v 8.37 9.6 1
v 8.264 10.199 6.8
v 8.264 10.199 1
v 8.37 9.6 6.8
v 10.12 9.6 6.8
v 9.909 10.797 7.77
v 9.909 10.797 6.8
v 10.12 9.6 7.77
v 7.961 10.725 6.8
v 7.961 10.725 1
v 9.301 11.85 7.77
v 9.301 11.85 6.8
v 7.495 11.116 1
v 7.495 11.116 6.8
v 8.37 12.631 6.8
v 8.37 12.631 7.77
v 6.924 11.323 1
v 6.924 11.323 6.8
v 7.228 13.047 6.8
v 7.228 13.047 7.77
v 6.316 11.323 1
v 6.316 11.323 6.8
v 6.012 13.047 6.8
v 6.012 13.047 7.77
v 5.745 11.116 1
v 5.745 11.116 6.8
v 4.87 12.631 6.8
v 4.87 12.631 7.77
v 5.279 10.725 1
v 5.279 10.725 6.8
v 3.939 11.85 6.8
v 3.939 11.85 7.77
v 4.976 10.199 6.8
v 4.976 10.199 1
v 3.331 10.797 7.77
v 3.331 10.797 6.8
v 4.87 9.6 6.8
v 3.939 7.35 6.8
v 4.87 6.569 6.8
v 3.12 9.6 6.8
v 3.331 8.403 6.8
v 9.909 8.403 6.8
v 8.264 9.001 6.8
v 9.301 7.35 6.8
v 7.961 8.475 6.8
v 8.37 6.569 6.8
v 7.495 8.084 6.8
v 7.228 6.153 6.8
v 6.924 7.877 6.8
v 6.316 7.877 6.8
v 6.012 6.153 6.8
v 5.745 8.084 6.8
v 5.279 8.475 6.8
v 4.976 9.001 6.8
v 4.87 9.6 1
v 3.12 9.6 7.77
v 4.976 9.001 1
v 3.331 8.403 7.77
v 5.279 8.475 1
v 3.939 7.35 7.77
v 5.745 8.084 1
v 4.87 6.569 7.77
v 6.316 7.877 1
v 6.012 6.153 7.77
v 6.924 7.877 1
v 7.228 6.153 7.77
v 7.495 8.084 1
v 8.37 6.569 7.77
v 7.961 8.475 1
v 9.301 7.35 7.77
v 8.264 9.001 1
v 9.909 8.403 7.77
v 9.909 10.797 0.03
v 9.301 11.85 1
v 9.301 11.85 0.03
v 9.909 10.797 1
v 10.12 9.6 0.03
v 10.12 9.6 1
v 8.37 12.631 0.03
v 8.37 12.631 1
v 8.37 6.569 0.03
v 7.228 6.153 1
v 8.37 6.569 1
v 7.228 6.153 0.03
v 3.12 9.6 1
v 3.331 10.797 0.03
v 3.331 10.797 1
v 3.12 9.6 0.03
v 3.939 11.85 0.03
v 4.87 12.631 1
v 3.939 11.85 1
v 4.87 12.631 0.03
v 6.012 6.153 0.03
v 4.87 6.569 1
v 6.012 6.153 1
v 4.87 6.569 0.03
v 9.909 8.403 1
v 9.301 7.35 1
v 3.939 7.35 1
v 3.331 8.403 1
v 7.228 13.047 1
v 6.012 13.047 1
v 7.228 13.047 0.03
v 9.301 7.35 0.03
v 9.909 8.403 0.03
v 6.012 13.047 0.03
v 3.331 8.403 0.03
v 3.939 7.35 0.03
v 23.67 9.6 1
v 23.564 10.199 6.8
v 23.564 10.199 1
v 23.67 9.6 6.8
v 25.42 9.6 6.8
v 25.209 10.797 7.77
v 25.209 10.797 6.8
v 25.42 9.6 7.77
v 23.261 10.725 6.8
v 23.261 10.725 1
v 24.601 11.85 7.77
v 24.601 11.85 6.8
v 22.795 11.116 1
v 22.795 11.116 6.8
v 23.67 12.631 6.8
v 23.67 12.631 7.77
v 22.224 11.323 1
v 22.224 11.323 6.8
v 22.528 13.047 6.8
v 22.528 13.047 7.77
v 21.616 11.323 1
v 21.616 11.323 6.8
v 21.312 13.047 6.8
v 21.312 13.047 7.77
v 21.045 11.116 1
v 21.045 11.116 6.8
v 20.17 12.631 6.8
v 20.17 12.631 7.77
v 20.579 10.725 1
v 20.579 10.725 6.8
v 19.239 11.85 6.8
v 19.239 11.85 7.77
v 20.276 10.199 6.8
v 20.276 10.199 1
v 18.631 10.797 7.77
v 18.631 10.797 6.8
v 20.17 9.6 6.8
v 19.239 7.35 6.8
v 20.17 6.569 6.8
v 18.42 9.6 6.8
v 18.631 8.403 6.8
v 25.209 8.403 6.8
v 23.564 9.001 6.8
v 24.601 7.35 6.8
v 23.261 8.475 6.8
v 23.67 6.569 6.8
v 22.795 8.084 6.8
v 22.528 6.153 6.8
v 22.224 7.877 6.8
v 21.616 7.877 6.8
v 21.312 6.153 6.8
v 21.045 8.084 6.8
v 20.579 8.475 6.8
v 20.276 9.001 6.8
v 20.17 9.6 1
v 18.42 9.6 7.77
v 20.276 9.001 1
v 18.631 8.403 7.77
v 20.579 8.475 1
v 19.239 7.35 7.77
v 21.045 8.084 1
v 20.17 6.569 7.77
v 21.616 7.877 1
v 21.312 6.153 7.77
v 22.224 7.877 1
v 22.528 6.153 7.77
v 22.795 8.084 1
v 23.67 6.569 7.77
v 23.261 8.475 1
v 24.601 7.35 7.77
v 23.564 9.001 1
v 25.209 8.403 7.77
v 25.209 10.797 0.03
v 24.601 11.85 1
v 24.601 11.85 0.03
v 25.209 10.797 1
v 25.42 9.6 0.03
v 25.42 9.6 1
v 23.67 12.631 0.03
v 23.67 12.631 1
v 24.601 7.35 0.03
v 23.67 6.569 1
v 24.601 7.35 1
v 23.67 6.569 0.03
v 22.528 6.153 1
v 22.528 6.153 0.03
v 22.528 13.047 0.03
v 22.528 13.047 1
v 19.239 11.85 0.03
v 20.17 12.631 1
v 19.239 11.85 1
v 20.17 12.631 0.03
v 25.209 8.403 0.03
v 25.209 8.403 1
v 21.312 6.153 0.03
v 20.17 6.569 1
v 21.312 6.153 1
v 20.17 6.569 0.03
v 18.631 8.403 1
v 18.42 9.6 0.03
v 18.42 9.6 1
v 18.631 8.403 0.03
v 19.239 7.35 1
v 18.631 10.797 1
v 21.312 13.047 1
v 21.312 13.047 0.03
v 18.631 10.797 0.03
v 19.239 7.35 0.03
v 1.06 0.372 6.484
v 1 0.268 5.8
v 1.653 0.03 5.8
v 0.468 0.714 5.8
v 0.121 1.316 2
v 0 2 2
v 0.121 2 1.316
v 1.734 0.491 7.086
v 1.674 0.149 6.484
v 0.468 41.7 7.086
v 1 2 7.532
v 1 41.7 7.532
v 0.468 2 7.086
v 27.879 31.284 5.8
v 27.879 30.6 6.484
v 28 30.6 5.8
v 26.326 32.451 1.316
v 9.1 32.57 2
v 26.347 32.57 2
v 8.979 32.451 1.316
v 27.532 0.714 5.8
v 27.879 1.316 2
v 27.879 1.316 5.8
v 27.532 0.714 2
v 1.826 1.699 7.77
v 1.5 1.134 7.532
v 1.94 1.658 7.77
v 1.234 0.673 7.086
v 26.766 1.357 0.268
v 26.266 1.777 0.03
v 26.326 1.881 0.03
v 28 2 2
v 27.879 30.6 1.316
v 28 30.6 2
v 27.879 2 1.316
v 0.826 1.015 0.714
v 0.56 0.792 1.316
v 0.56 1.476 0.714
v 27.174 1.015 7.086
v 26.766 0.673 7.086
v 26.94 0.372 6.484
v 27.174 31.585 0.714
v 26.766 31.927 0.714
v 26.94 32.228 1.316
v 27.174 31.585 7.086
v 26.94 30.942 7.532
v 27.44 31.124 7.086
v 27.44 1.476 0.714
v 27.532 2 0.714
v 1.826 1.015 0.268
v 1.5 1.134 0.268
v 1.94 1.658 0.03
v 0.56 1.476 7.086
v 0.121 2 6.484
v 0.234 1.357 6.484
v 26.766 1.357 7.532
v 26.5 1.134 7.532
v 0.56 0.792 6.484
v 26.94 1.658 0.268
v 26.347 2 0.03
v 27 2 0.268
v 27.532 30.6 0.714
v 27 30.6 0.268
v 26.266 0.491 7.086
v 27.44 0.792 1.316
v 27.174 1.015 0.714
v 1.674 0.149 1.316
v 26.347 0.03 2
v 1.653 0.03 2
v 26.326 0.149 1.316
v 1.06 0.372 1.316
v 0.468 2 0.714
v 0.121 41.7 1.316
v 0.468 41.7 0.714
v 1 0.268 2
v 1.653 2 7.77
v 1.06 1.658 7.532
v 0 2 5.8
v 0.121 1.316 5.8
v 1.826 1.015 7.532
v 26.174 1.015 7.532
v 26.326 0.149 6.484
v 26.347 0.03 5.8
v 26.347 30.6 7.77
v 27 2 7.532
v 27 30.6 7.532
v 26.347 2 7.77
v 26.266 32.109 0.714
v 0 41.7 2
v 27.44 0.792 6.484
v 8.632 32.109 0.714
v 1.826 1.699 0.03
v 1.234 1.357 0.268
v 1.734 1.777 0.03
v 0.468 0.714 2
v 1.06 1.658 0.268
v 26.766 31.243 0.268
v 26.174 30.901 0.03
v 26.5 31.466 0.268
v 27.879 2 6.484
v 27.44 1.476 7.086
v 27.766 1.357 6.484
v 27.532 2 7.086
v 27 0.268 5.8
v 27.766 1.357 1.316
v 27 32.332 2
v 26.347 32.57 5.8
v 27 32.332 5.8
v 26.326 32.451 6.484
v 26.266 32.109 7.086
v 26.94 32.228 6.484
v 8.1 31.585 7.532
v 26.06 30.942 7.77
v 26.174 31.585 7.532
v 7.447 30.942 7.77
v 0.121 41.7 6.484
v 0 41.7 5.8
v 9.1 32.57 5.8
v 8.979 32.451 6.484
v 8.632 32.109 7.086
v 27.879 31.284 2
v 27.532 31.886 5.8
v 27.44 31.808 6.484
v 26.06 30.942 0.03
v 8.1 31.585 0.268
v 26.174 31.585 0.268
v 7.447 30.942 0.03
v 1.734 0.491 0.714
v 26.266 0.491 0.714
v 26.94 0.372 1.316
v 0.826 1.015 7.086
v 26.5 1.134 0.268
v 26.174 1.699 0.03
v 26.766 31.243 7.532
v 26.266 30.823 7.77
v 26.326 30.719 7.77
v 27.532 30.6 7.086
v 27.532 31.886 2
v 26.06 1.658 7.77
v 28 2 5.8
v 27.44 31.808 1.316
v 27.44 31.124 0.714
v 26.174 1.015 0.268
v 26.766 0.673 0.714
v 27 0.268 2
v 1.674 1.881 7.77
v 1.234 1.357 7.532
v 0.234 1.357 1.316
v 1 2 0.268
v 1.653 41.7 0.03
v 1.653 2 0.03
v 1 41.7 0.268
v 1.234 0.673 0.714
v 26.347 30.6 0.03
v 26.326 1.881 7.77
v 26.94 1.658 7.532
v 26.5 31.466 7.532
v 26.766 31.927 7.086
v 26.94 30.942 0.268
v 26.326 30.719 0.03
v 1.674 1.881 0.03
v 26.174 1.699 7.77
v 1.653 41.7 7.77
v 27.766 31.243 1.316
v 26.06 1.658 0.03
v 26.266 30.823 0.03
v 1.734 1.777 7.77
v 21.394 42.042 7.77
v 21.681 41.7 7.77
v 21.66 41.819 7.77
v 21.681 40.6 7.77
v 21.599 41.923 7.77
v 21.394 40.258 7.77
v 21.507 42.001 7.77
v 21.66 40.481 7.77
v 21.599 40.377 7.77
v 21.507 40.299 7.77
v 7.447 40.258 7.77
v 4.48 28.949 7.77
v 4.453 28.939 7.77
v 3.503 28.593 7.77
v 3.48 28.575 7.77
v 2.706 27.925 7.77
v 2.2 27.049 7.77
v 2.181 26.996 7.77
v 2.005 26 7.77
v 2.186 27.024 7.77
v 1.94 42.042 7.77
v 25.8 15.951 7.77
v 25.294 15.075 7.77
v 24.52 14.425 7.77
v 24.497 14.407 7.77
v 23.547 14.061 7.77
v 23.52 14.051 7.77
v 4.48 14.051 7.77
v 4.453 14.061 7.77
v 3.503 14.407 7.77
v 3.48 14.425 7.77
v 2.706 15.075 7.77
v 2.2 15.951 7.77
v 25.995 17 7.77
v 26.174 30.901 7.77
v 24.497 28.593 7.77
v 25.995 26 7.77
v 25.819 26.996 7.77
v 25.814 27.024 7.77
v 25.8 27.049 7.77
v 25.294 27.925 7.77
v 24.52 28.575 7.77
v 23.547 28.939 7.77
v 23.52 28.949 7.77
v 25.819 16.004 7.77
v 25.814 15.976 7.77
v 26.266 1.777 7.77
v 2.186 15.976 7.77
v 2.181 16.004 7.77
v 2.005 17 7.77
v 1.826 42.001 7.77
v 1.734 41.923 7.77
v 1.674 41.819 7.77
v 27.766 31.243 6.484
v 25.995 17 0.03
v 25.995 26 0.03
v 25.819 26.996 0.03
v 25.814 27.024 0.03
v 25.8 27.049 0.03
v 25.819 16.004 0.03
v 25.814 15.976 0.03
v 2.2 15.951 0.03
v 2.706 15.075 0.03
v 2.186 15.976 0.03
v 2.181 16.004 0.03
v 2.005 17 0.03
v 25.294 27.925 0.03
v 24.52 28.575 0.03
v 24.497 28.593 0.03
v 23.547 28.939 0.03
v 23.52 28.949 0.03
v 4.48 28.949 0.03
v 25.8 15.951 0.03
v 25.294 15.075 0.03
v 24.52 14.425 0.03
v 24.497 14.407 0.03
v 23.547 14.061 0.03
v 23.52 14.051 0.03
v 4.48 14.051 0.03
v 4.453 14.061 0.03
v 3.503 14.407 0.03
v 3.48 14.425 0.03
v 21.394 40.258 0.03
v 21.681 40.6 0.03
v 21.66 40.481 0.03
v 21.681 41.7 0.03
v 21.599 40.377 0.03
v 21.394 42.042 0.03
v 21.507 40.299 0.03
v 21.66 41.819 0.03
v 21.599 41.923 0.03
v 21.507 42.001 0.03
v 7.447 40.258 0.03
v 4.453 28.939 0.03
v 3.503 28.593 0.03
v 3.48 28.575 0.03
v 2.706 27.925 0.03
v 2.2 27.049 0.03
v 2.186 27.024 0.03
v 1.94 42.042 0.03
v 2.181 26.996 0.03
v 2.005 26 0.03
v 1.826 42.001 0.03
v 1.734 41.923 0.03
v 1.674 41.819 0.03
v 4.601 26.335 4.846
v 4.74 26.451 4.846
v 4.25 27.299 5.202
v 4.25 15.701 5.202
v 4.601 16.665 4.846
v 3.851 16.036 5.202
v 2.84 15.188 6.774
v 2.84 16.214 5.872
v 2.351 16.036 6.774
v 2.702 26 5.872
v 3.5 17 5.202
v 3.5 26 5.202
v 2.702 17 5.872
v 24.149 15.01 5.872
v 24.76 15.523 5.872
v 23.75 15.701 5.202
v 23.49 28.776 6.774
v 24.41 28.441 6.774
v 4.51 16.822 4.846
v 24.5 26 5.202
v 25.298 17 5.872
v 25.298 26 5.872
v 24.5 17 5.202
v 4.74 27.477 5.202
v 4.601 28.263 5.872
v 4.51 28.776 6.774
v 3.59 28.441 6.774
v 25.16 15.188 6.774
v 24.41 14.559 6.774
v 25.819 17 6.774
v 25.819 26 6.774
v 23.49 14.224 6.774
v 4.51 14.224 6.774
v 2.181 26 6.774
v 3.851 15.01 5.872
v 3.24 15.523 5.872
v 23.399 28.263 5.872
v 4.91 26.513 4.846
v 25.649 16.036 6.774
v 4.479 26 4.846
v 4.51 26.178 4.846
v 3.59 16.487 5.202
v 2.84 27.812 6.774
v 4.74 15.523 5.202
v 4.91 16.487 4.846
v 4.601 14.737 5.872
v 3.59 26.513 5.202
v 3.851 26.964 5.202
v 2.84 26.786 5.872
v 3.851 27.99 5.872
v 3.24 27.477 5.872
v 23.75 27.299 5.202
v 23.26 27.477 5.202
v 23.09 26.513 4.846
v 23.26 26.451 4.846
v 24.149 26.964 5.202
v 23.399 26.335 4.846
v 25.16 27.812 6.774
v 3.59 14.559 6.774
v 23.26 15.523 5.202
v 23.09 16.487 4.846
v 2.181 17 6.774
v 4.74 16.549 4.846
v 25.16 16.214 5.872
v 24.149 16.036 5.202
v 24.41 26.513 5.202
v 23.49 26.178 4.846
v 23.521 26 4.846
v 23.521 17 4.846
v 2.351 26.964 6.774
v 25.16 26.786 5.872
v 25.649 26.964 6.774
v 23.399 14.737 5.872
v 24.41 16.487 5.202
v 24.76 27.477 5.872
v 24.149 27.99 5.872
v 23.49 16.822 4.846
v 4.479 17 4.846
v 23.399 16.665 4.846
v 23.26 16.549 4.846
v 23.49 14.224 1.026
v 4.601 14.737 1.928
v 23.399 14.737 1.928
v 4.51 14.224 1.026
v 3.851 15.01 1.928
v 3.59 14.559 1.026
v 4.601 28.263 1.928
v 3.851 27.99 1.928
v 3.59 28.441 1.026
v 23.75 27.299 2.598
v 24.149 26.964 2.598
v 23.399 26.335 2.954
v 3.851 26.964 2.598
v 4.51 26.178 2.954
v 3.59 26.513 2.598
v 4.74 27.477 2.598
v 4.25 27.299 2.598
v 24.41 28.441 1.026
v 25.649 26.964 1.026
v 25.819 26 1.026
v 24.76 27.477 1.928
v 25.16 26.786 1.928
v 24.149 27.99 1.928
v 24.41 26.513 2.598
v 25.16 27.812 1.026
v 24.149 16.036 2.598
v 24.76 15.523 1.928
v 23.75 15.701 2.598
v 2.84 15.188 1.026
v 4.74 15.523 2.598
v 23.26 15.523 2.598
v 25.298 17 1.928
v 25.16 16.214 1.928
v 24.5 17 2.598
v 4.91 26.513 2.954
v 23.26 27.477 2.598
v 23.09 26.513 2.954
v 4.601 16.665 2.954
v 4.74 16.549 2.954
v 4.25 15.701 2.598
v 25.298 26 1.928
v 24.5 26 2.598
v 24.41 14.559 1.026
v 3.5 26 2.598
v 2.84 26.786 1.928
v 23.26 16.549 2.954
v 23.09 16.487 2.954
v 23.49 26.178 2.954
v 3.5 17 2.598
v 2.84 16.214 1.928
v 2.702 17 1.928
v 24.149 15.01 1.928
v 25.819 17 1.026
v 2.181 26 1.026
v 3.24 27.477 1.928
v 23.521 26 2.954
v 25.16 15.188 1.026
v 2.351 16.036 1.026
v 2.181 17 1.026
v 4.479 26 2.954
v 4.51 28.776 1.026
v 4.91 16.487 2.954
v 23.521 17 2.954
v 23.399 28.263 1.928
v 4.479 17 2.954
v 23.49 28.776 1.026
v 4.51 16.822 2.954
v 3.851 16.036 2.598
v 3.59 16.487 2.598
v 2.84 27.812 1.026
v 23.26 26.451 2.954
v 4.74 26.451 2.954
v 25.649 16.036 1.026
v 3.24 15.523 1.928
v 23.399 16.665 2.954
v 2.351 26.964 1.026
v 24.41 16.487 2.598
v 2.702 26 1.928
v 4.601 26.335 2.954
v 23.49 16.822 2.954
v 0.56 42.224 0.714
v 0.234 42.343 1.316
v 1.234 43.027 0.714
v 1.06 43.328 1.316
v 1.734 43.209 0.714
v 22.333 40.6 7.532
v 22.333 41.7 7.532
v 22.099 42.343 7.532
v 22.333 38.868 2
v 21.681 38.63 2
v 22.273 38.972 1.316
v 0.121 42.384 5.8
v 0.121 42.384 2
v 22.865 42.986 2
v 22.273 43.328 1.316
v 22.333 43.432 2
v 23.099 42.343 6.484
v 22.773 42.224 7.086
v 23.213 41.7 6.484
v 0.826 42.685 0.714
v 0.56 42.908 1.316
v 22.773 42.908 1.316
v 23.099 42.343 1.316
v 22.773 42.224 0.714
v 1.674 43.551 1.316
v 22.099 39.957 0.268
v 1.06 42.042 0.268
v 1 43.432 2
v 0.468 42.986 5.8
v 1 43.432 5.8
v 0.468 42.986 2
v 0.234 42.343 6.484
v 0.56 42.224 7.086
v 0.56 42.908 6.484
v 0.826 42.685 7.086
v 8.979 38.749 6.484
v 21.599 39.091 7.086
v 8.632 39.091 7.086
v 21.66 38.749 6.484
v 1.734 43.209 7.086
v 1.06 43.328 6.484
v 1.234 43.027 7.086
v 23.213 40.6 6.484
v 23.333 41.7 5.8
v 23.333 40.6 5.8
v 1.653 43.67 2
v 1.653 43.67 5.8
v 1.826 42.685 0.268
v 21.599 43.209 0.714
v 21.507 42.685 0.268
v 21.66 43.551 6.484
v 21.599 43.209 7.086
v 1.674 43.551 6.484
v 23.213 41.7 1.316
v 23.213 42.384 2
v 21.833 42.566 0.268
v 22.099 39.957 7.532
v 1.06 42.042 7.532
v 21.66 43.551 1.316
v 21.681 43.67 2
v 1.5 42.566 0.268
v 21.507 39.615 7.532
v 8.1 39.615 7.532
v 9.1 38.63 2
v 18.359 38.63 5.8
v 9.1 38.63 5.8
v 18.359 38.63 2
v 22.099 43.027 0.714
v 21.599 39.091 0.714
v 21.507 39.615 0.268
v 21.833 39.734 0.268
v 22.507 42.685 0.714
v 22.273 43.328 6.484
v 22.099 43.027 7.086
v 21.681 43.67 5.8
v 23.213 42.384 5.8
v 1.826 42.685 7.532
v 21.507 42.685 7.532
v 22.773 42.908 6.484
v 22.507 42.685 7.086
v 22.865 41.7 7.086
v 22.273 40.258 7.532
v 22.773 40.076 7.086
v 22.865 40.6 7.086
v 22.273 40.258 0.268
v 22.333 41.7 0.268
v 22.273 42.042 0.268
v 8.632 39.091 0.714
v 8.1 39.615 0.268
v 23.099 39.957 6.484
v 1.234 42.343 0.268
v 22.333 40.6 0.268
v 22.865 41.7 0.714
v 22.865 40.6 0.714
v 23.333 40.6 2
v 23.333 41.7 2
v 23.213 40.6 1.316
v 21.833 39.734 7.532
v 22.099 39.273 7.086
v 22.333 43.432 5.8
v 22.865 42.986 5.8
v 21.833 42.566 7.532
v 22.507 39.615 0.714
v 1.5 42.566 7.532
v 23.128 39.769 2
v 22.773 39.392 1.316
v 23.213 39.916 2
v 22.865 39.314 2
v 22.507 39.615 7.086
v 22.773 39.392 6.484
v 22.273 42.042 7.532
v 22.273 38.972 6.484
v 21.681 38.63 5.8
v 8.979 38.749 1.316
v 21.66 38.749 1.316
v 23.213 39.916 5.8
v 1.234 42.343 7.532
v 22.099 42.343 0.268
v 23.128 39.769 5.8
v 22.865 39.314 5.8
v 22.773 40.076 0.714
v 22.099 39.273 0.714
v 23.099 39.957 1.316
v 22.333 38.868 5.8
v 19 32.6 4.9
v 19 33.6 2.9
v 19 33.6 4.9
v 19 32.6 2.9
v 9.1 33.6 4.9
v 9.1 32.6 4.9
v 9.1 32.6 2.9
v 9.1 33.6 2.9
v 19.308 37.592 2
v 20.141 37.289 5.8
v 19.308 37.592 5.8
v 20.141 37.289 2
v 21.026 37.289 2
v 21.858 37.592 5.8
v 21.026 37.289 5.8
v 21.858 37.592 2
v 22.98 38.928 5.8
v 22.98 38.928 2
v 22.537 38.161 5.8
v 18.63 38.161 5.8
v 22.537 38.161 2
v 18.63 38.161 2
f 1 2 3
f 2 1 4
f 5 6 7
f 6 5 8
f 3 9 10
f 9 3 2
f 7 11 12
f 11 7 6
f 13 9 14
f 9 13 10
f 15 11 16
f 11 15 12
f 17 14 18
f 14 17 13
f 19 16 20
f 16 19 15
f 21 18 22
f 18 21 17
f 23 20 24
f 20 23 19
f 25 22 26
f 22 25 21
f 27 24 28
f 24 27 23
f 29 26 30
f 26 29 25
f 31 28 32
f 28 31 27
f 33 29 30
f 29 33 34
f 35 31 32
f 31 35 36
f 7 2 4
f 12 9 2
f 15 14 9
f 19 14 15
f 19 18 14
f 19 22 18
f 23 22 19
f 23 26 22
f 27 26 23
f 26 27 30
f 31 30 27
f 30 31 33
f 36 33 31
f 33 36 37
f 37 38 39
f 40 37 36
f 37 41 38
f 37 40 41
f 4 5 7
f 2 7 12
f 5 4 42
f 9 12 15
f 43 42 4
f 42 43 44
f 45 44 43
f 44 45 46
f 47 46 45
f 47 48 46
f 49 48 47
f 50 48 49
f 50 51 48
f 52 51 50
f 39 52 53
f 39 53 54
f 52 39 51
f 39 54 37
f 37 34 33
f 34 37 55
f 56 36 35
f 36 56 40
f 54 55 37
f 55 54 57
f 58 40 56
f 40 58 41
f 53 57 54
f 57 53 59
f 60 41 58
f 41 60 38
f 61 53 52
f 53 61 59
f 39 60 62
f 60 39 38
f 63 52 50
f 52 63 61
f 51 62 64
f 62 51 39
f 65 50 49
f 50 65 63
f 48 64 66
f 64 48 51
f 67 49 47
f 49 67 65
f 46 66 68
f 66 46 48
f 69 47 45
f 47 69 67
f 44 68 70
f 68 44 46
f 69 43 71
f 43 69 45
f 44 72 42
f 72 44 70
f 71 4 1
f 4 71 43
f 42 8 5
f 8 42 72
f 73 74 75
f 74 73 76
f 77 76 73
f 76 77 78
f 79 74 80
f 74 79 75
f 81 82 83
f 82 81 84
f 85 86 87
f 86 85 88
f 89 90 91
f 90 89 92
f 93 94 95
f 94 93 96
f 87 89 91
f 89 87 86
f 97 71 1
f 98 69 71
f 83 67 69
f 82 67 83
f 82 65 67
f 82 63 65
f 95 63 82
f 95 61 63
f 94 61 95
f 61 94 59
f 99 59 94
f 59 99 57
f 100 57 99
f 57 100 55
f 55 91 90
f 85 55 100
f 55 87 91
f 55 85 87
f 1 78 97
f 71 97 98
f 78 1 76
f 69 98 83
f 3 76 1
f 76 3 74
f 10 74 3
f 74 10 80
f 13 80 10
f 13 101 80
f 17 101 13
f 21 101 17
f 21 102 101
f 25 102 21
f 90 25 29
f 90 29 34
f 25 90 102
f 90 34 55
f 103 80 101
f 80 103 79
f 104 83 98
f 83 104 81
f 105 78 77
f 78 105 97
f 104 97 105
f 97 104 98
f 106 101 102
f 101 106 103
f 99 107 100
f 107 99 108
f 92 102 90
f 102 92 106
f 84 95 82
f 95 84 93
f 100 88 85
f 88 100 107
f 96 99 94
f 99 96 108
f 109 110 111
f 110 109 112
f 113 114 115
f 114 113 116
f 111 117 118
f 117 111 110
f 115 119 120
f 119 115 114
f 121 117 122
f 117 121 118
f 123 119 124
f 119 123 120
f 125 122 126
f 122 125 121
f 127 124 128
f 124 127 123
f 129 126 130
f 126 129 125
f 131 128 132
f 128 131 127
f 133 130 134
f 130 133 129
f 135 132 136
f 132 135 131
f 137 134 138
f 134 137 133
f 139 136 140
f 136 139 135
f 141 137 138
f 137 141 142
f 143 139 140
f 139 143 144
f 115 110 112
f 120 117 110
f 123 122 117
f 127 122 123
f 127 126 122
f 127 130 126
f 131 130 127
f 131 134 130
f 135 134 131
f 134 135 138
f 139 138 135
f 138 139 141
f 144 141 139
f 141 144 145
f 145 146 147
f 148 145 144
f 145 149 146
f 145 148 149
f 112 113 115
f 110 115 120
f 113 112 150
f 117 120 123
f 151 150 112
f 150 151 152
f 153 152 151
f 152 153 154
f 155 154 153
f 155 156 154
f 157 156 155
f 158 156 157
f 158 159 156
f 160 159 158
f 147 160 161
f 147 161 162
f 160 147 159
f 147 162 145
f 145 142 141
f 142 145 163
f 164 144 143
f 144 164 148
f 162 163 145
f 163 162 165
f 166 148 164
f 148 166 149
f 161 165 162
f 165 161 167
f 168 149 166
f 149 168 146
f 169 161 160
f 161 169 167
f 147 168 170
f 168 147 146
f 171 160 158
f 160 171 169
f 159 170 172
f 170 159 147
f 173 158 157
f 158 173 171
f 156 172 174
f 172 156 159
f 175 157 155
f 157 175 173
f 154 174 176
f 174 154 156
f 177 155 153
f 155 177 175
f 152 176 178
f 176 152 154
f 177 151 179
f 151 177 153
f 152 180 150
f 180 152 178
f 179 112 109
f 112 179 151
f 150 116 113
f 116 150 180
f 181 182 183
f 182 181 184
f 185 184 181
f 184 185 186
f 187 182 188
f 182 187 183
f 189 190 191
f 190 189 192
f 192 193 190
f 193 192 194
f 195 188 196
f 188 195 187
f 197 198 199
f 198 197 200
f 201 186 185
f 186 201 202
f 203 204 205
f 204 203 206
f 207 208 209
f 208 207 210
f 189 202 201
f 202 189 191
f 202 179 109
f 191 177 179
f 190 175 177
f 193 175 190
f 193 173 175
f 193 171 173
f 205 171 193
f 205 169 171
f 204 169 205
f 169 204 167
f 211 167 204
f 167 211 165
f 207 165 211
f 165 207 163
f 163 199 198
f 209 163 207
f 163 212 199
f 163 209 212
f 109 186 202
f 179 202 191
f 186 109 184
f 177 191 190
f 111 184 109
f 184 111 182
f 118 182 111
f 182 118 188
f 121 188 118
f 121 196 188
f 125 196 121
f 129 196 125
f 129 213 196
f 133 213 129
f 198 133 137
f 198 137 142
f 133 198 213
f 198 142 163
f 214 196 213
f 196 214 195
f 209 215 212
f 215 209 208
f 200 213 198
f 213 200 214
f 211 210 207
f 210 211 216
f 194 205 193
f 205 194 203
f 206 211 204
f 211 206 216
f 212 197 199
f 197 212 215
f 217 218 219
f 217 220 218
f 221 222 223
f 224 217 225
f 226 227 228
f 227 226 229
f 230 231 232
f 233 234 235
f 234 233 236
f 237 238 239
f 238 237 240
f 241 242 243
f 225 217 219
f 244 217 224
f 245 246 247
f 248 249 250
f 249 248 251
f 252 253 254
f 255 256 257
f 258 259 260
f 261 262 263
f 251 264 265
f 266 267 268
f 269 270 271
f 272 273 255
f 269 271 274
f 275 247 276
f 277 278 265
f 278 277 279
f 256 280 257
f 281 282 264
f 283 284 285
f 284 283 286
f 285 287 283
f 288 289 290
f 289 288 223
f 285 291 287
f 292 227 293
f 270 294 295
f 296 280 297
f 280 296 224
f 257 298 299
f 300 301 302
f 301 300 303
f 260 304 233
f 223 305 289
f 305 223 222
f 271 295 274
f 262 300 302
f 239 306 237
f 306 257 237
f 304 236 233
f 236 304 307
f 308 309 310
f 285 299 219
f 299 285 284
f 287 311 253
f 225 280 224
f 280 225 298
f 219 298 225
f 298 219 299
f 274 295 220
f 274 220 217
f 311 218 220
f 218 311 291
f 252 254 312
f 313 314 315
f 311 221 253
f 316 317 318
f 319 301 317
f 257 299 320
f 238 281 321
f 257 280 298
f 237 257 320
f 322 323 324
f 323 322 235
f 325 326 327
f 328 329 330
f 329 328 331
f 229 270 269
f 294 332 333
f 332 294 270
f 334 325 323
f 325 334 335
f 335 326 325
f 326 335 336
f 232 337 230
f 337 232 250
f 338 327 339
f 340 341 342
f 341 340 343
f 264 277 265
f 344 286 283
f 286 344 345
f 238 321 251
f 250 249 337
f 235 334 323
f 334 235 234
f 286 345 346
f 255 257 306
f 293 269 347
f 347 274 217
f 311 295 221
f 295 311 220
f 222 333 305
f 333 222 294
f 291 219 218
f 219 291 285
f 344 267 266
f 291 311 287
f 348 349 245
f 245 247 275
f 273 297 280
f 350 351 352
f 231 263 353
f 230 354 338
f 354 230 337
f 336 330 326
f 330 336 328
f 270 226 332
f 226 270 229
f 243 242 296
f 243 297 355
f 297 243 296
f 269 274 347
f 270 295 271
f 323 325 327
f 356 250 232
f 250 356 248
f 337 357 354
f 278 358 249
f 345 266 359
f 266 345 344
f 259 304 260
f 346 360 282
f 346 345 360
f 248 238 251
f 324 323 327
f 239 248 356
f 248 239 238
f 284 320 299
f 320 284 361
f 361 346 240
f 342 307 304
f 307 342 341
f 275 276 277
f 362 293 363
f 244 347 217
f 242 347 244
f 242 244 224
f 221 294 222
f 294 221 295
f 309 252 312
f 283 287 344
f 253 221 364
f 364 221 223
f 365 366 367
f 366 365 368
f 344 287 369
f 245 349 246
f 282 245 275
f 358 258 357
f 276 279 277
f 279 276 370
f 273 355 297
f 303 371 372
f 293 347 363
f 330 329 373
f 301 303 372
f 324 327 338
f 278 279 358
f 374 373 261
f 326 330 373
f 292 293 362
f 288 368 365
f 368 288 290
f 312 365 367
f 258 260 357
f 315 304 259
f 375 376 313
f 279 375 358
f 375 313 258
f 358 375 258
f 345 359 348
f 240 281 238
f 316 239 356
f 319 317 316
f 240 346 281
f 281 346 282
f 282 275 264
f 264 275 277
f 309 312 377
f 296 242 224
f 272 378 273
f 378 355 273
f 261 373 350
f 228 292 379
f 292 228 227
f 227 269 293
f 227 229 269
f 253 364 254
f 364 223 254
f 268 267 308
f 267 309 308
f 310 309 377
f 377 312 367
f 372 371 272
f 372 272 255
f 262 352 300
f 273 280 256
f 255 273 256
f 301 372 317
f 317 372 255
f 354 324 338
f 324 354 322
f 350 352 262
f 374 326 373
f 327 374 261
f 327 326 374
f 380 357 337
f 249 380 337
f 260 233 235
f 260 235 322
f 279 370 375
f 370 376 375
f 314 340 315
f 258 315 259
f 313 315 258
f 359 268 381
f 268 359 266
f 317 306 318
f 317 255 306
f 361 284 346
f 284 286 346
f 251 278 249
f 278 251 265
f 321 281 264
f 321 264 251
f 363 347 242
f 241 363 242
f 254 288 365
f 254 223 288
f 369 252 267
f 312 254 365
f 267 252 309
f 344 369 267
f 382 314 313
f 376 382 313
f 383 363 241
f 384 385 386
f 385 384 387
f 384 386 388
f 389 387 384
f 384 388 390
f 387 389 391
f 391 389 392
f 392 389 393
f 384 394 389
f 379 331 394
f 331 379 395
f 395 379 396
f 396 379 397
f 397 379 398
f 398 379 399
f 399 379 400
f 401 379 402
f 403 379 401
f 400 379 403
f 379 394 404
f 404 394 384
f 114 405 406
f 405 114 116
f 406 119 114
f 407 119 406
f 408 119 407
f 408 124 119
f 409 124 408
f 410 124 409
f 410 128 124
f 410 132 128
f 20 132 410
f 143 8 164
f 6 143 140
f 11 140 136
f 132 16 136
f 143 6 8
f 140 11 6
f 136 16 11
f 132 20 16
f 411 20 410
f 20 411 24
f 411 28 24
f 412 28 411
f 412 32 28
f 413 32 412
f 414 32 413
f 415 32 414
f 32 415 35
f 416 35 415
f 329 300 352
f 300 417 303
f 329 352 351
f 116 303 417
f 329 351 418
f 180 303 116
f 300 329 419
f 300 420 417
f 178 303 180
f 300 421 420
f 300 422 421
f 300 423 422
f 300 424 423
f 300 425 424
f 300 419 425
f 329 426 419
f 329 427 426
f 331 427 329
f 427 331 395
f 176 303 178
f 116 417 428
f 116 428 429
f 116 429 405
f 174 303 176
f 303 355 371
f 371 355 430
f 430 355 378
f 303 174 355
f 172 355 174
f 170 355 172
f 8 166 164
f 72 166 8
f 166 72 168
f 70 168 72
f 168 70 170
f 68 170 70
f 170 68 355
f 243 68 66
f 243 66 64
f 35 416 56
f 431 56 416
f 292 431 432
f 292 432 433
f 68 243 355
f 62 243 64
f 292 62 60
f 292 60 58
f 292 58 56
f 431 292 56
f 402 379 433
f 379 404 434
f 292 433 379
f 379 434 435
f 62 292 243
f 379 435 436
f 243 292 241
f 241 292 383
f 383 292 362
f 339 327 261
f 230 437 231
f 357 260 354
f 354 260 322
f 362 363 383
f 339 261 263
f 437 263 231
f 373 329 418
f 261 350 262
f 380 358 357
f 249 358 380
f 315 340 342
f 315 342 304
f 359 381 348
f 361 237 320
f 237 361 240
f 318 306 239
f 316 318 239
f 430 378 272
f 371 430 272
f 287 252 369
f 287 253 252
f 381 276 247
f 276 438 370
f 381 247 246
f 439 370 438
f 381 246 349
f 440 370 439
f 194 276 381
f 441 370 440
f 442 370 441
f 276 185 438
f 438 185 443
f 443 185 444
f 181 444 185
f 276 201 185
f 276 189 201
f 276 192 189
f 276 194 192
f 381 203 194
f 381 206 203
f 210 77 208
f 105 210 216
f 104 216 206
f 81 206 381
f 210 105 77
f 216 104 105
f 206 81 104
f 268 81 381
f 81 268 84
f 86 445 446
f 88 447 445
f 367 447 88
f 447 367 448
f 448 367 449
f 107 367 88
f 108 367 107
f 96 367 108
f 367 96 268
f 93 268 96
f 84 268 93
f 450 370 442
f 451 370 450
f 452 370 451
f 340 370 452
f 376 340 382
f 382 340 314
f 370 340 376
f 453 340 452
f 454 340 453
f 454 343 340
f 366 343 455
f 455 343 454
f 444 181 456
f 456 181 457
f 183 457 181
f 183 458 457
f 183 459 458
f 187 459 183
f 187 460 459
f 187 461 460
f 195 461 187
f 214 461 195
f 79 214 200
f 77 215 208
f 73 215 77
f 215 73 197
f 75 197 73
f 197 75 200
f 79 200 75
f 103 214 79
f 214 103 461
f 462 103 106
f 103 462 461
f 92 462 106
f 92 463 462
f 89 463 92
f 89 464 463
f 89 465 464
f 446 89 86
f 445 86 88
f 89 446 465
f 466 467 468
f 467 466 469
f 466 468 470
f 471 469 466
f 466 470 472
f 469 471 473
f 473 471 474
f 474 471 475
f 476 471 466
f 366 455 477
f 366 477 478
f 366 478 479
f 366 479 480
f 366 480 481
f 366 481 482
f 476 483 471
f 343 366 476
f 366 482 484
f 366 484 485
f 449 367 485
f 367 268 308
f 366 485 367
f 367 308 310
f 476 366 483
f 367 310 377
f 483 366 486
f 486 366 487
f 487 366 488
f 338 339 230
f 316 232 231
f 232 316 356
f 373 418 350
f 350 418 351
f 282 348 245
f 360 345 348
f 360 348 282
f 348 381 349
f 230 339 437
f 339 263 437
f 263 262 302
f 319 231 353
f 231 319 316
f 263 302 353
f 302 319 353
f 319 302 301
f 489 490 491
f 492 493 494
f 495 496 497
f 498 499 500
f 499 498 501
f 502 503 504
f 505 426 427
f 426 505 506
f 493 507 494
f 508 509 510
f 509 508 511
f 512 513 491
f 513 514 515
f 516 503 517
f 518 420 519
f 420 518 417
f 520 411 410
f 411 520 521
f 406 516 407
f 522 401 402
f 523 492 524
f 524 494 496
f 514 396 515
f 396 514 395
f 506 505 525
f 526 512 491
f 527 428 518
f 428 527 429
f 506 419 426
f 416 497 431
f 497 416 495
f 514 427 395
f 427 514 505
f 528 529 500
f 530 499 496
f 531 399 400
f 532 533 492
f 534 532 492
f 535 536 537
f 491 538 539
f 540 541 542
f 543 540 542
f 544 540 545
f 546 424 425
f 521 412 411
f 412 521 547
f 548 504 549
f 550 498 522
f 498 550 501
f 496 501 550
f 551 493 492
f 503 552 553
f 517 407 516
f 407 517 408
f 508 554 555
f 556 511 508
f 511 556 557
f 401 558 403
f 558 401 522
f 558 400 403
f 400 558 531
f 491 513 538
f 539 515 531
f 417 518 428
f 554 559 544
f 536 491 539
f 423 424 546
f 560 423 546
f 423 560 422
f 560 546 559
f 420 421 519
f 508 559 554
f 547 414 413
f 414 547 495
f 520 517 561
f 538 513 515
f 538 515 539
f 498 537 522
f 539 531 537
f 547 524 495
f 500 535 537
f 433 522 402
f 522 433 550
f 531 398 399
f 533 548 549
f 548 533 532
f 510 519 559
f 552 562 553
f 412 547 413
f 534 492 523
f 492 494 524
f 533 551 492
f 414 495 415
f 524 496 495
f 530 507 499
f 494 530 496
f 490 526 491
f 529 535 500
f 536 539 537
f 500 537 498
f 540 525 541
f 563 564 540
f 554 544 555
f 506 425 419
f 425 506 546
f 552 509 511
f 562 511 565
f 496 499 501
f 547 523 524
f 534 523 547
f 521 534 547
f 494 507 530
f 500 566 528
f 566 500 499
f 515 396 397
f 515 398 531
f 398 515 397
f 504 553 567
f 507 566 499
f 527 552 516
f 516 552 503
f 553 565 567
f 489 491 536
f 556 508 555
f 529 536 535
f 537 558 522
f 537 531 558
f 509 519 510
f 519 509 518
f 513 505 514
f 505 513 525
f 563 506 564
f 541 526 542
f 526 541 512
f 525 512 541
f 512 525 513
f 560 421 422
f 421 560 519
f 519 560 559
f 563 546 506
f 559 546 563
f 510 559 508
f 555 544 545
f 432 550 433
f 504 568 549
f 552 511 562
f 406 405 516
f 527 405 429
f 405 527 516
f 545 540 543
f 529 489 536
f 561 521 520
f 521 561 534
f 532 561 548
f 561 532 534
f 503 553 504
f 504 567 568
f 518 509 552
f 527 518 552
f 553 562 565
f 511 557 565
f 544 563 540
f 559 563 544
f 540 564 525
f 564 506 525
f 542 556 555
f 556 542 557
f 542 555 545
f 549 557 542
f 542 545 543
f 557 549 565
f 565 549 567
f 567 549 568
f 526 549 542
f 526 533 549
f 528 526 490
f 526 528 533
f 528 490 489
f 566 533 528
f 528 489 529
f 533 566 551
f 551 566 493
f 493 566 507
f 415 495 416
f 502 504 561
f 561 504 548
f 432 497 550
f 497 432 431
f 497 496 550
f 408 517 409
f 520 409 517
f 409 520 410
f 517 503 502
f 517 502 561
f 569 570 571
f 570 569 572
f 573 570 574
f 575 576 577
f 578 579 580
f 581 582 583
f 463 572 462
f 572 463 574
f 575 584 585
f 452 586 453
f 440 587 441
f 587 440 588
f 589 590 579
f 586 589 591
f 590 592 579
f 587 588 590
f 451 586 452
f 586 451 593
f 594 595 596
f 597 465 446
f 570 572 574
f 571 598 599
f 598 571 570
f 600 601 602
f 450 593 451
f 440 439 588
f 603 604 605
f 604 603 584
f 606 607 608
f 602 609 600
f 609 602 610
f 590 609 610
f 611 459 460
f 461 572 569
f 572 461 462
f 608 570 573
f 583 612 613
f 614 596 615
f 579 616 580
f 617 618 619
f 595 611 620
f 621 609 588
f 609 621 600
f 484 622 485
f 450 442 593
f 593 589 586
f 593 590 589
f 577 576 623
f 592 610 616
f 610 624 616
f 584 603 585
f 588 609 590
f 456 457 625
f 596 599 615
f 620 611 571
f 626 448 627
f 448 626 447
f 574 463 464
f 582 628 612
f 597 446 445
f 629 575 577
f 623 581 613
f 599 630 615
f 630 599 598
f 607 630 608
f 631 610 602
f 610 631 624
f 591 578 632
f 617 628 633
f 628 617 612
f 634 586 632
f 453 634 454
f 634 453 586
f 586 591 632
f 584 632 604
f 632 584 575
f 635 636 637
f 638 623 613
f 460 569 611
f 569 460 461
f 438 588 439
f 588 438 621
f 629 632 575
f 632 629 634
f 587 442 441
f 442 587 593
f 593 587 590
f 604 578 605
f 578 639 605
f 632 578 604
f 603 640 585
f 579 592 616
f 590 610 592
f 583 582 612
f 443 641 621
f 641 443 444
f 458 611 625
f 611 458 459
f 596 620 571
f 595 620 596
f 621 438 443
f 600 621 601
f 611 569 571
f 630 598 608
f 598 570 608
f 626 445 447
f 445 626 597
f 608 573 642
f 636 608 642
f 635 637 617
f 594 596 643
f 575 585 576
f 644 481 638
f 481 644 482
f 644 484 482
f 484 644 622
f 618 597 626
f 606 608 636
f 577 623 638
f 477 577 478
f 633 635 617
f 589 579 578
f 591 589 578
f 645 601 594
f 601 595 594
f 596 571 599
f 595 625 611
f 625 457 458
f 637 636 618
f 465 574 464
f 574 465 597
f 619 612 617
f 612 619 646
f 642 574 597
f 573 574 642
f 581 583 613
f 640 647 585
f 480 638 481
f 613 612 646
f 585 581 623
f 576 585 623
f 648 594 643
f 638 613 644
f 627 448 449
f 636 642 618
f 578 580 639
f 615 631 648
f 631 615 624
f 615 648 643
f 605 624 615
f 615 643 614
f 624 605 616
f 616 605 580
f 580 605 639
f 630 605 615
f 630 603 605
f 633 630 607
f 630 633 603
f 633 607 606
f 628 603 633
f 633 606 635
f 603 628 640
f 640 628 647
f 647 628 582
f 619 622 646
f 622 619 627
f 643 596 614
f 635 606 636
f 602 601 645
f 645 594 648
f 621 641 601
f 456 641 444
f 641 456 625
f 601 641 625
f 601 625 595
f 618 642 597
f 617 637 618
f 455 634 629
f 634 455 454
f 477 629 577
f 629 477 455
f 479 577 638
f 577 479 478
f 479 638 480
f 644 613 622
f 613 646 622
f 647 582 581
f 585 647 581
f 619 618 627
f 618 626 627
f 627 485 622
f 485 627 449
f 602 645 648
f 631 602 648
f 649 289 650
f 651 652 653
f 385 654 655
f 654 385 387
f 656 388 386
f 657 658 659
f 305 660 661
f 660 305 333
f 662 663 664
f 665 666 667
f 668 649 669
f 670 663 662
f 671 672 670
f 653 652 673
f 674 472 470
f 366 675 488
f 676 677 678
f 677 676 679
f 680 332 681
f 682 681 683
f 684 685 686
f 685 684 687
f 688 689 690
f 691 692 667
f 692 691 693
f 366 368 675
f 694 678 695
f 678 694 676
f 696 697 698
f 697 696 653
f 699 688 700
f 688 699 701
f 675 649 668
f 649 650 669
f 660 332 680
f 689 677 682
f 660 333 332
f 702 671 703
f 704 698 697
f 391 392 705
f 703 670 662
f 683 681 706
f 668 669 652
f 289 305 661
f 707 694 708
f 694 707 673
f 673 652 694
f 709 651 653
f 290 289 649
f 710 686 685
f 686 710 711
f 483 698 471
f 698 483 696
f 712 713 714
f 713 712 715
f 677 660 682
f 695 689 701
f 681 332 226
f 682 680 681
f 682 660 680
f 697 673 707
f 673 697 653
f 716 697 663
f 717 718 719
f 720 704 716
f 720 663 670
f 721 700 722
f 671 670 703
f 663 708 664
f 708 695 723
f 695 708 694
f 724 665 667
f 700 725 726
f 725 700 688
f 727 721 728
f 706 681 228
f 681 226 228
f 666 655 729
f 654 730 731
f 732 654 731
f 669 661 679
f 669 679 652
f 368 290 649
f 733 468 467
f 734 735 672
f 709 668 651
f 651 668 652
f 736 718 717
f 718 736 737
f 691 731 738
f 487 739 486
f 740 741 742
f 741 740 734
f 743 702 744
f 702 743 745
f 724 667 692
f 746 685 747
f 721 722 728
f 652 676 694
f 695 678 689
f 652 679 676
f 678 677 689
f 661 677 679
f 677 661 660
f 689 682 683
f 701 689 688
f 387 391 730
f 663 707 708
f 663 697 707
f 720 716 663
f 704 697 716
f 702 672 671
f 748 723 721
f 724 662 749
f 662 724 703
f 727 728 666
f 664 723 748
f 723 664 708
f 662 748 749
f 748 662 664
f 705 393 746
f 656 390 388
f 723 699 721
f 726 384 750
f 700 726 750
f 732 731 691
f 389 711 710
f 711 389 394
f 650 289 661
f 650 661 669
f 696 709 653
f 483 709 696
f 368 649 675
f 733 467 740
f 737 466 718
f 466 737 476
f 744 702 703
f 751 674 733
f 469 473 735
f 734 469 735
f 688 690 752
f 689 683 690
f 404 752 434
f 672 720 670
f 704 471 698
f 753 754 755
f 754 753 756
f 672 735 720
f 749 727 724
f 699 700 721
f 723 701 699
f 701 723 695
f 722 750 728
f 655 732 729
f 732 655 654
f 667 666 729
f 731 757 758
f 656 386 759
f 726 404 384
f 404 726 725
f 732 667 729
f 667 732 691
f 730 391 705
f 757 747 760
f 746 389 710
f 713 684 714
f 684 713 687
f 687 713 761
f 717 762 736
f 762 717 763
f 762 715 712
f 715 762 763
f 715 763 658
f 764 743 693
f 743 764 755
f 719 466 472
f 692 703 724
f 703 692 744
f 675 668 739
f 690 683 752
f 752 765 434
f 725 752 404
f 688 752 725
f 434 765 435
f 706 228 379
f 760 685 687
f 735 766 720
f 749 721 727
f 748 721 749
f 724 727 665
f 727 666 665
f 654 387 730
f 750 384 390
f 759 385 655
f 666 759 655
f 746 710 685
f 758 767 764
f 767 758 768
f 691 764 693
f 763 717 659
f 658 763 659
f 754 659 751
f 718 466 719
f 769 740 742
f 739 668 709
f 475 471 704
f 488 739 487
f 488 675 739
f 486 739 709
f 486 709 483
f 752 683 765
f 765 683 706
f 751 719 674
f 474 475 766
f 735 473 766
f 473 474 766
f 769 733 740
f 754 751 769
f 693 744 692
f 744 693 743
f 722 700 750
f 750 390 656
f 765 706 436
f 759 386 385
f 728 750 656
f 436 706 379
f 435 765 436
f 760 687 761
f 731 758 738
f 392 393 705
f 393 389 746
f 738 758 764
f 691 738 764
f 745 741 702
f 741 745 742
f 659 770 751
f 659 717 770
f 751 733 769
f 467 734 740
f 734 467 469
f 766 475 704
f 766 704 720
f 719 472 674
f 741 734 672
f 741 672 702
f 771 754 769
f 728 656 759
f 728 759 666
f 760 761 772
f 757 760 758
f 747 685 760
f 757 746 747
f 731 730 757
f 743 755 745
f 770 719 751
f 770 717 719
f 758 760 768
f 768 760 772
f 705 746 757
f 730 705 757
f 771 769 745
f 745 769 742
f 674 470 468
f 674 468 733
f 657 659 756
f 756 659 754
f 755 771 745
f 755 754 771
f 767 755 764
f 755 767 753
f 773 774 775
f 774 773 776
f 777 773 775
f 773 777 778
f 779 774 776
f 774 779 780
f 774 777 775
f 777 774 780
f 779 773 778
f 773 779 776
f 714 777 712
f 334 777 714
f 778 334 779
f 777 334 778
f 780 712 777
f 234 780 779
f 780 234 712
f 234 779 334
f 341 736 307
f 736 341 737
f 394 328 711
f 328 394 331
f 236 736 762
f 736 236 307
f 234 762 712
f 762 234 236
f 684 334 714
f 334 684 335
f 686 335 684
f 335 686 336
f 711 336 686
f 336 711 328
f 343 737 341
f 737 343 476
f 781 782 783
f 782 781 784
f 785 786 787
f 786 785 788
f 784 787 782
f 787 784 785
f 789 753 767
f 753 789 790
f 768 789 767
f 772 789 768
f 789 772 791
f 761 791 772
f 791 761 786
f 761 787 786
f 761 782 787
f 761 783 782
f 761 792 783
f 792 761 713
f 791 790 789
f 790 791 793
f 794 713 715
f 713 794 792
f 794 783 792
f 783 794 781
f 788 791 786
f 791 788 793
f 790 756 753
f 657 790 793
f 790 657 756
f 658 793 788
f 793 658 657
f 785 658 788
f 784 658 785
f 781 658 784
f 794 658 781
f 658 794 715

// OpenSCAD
$fn=18;
grop_offset = 2;
main_width = 28;
main_length = 32.6;
main_height = 7.8;

prong_thick = 5.1;
round_radius_main = 2;
round_radius_intrusion = 3;

module rounded_cube(x, y, height, radius)
{
    module rounded_cylinder(xpos, ypos, height, radius)
    {
        translate([xpos, ypos, radius]) 
        union()
        { 
            cylinder(r=radius, h=height-2*radius);
            sphere(r=radius);
            translate([0,0, height-2*radius]) sphere(r=radius);
        }
    }
    hull()
    {
        rounded_cylinder(radius, radius, height, radius);
        rounded_cylinder(x-radius, radius, height, radius);
        rounded_cylinder(radius, y-radius, height, radius);
        rounded_cylinder(x-radius, y-radius, height, radius);
    }
}

module screw_hole(x, y, inner_d, outer_d, outer_depth, depth)
{
    translate([x,y,depth])
    rotate([0,180,0])
    rotate_extrude()
    union() {
        square([inner_d/2, depth]);
        square([outer_d/2, outer_depth]);
    }
    translate([x, y, -1]) cylinder(r=outer_d/2, h=outer_depth);
}




difference(){
    rounded_cube(main_width, main_length, main_height, 2);
    screw_hole(6.62, 9.6, 3.5, 7, 2, main_height+1);
    screw_hole(6.62+15.3, 9.6, 3.5, 7, 2, main_height+1);
    translate([grop_offset, 14, main_height-1]) rounded_cube(main_width-grop_offset*2, 15, 4, round_radius_intrusion);
    translate([grop_offset, 14, -3]) rounded_cube(main_width-grop_offset*2, 15, 4, round_radius_intrusion);
    }


    

union()
{
translate([0, main_length+6, 0]) rounded_cube(main_width/1.2, prong_thick, main_height, round_radius_main);
translate([(main_width-10)/2,main_length, (main_height-2.0)/2]) cube([10, 1, 2.0]);

translate([0, main_length-4.0, 0]) rounded_cube(9.1, 14.4, main_height, round_radius_main);
translate([(main_width/1.2+prong_thick/2-5.3), main_length+6+1.2, round_radius_main]) 
cylinder(r=prong_thick/2, h=main_height-2*round_radius_main);  
}



//#cube([]);
